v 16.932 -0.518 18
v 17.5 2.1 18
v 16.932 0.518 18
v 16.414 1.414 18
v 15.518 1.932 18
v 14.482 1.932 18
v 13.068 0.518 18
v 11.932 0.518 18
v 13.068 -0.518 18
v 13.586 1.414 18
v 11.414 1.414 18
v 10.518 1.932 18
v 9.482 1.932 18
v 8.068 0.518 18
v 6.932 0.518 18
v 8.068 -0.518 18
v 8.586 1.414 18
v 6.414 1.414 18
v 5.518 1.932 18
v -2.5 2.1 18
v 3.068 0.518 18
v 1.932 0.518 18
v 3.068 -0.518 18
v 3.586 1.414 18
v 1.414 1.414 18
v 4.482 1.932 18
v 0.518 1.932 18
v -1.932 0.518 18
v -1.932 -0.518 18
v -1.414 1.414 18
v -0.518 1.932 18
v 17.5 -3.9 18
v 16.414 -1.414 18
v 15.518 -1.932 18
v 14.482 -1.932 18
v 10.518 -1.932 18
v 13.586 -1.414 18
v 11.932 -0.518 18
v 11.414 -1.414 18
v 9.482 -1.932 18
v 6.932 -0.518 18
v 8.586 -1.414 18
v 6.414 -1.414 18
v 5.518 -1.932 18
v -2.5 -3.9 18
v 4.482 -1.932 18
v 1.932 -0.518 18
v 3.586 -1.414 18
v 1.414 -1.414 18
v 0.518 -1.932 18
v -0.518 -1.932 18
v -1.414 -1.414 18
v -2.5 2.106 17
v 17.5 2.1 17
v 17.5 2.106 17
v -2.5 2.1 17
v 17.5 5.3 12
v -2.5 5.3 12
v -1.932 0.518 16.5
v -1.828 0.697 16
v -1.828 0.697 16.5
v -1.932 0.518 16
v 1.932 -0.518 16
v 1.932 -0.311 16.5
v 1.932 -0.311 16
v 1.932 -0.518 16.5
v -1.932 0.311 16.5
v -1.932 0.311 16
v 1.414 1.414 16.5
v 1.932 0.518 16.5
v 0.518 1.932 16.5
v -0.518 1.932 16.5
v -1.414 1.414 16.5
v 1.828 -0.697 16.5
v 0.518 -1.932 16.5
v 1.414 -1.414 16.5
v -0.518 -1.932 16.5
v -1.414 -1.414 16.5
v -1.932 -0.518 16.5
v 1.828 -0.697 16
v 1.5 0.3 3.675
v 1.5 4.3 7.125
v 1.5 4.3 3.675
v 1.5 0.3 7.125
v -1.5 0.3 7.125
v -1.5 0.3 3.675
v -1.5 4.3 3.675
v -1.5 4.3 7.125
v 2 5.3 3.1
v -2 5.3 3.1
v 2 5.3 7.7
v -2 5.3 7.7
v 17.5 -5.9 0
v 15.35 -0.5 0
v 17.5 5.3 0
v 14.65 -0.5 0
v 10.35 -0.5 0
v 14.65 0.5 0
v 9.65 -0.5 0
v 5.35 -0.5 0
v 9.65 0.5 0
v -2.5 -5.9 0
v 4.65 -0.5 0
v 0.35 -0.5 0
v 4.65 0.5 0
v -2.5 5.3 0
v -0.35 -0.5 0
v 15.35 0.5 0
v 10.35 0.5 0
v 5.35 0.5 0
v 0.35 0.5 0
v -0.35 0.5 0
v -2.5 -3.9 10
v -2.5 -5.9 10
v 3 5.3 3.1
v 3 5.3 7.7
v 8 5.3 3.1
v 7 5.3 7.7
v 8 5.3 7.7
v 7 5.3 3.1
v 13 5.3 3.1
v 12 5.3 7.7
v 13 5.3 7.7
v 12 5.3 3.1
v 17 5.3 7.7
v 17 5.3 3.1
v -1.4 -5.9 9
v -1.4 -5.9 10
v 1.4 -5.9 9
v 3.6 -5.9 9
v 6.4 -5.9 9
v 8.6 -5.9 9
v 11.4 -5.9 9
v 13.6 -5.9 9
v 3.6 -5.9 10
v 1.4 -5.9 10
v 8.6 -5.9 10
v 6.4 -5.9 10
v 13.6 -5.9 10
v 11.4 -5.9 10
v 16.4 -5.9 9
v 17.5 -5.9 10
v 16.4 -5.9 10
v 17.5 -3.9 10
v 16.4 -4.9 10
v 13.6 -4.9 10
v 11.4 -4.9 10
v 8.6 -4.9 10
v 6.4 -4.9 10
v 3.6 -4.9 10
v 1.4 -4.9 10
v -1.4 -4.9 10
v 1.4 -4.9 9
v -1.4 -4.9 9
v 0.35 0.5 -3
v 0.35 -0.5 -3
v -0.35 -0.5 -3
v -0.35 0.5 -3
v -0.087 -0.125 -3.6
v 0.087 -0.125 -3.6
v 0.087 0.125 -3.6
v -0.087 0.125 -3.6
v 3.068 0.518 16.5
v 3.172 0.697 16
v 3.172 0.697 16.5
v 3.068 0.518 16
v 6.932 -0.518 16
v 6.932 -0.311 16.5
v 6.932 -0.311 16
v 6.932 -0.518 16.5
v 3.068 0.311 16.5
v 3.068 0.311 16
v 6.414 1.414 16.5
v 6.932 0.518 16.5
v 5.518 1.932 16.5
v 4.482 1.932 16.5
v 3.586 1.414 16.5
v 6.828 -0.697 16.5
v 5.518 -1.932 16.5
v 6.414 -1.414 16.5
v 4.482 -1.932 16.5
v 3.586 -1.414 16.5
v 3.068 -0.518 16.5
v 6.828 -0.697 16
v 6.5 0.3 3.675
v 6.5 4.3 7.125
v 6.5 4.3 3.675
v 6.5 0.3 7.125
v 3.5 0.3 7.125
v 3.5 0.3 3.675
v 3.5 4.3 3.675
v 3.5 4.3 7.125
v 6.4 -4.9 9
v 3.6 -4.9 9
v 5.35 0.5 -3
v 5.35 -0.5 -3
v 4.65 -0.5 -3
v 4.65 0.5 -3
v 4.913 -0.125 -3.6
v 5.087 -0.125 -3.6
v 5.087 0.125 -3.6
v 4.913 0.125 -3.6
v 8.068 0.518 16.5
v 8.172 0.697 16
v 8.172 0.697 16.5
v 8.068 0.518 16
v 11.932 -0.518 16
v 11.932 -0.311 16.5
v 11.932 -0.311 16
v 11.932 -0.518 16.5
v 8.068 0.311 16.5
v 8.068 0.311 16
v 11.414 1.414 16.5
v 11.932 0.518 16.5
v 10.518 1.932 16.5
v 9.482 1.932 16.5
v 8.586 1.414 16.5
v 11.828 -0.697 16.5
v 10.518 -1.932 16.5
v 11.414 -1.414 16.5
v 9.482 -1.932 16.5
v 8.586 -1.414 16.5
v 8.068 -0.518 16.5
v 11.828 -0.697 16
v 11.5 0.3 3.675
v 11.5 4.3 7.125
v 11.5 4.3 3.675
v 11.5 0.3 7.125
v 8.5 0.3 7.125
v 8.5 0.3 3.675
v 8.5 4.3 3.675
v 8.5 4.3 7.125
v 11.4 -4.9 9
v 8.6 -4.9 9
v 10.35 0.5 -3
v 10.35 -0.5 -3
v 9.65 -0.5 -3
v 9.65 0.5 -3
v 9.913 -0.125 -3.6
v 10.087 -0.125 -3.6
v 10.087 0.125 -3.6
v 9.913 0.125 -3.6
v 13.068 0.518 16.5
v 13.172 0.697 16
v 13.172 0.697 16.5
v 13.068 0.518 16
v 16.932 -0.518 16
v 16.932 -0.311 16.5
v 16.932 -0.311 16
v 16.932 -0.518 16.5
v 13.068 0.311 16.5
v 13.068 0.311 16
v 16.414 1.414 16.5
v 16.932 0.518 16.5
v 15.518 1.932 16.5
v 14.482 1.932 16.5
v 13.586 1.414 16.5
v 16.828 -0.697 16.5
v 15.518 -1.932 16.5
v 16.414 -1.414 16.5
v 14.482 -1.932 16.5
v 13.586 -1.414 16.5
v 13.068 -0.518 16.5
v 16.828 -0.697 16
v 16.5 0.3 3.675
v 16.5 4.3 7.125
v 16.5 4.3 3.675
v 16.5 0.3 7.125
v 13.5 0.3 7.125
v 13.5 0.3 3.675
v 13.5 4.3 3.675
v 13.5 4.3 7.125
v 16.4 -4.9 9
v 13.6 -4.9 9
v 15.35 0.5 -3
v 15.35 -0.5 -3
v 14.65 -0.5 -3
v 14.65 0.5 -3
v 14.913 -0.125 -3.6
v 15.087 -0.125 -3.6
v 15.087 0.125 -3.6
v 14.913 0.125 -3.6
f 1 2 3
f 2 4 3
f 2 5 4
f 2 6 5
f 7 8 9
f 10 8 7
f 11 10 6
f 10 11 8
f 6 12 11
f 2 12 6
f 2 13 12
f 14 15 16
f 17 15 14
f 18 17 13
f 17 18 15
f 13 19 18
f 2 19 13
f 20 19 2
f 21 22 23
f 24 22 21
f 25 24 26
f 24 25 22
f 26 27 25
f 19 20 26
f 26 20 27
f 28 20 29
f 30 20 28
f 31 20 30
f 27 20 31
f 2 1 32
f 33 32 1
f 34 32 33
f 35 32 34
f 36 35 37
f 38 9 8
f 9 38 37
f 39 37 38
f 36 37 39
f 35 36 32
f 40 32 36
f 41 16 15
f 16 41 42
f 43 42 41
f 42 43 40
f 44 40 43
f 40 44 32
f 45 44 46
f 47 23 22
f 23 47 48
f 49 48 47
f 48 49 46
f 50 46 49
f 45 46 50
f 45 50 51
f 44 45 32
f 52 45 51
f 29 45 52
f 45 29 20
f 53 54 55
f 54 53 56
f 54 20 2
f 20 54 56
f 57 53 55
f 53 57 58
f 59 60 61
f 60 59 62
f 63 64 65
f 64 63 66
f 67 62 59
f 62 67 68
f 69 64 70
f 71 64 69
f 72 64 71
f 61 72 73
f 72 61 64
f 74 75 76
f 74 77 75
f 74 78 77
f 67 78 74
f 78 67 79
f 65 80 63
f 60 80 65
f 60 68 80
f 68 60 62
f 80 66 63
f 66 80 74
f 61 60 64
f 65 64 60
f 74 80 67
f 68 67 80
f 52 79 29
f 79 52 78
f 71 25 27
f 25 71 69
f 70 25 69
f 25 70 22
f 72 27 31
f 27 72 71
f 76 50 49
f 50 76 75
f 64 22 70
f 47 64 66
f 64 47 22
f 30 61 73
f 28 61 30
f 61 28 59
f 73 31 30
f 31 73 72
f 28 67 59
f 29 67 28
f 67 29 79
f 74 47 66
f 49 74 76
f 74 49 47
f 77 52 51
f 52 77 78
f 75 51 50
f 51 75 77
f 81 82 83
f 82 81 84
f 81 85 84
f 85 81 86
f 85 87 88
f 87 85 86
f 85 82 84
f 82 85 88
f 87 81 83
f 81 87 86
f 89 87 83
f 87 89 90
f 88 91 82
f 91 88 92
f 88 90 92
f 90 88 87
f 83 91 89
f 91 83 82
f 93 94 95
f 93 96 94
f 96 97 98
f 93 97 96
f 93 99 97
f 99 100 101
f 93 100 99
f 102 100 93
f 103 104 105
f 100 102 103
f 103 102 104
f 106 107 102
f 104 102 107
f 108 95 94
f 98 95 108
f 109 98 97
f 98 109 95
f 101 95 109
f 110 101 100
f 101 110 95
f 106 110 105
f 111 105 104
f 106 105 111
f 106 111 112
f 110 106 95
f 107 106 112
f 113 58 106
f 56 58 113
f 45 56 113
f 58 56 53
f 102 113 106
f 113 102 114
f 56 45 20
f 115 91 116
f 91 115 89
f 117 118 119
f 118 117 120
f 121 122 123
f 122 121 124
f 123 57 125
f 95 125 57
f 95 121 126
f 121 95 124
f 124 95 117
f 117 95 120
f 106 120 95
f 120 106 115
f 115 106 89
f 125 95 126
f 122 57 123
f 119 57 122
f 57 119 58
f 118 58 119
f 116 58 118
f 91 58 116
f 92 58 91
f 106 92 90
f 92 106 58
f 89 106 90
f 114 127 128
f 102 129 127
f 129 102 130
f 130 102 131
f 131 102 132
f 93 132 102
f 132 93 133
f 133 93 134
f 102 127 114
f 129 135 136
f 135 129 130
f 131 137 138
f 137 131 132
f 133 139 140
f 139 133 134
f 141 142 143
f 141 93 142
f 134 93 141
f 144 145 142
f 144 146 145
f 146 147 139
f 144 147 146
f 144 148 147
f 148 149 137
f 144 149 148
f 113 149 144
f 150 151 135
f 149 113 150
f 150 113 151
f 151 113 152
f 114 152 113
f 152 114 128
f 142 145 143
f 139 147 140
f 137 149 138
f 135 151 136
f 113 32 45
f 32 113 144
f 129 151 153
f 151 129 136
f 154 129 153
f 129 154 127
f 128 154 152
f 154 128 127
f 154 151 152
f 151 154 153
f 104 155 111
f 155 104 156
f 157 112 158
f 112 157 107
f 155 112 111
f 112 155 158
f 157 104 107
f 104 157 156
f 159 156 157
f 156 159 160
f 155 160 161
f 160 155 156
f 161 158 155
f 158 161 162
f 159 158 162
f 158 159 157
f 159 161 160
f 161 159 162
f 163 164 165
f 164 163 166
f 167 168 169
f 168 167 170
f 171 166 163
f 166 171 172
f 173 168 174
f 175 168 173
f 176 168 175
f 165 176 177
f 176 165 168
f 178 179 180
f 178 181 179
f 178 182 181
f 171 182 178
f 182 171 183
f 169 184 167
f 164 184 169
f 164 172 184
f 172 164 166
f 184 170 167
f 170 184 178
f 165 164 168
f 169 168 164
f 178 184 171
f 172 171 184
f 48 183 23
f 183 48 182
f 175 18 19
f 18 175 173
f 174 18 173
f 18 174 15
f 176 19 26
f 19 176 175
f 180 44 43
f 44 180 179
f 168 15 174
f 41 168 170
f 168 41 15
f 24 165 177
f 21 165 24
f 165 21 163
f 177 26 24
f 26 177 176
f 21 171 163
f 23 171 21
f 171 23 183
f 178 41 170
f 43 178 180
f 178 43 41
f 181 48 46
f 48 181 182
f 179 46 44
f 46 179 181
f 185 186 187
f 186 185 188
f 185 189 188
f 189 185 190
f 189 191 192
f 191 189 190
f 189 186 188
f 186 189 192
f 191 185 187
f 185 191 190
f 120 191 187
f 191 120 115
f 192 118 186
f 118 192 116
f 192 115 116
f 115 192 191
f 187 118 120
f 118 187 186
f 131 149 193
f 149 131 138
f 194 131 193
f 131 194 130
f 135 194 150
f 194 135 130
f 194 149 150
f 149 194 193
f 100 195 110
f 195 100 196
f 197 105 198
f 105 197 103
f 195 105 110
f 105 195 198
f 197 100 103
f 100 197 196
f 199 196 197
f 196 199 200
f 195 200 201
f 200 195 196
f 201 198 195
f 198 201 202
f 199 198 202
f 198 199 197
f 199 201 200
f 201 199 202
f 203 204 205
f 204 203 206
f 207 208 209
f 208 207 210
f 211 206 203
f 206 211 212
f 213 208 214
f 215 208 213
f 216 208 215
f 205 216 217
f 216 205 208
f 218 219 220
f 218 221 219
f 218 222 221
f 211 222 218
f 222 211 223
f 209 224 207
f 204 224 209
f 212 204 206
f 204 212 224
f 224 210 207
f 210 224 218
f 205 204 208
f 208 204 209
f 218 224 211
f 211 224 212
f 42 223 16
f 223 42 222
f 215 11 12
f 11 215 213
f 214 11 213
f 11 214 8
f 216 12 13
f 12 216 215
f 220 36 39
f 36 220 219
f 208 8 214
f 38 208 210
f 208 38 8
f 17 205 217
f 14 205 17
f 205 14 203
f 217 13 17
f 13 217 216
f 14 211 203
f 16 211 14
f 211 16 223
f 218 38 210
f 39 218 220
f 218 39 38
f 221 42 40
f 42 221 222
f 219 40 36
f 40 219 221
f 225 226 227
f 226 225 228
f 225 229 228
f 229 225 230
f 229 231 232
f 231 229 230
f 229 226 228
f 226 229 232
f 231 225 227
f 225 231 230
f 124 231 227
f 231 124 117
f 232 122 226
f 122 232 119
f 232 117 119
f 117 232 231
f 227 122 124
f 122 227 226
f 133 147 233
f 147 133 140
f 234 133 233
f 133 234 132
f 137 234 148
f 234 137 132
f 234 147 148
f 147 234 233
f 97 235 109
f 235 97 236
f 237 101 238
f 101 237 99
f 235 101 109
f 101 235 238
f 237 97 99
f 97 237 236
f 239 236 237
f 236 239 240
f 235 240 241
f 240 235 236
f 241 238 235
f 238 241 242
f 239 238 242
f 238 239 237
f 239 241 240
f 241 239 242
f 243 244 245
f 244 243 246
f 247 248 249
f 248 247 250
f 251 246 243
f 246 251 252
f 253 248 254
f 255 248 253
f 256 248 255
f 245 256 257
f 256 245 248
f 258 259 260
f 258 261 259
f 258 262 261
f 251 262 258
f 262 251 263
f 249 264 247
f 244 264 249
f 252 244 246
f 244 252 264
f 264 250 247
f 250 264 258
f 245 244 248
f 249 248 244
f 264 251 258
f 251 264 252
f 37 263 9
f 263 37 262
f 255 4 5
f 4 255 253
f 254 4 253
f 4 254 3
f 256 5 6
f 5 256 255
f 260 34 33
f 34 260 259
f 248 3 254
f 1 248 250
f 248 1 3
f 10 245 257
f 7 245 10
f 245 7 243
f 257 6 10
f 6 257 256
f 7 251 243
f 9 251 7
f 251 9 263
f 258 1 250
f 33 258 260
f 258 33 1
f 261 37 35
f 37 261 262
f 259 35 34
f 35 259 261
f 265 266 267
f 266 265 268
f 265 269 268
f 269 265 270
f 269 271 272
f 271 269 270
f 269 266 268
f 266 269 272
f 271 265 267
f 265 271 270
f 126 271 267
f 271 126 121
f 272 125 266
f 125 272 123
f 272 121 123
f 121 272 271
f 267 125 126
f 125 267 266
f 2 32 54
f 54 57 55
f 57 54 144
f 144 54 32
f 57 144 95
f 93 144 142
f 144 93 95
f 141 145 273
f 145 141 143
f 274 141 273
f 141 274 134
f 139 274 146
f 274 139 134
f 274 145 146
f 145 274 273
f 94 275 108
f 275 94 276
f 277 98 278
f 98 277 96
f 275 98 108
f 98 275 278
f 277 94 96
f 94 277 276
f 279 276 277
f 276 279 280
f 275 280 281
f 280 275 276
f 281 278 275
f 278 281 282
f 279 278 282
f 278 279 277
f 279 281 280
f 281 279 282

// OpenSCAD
module wedge(x,y,z){
    translate([0,y/2,z/2]) resize([x,y,z]){
        rotate([0,90,0]) translate([0,0,-0.5]) linear_extrude(1){
            polygon([[-0.5,0.5],[-0.5,-0.5],[0.5,-0.5]],1);
        }
    }
}

module terminal(){
    translate([0,-0.3,0]){
        difference(){
            translate([0,0,9]) cube([5,11.2,18],true);
            translate([0,-4.6,14]) cube([5,2,8], true);
            translate([0,-5.1,9.5]) cube([2.8, 1, 1], true);
            translate([0,5.6,12]) rotate([0,0,180]){
                translate([0,1.6,5.5]) cube([5.01,3.2,1], true);
                wedge(5.01,3.2,5.01);
            }
            translate([0,0.3,16.5]) rotate([0,0,15]){
                cylinder(1.5,2,2,$fn=12);
                translate([0,0,-0.5]) rotate([0,0,60]){
                    intersection() {
                        cylinder(0.5,2,2,$fn=12);
                        translate([-0.2,-2,0]) cube([0.4,4,0.5]);
                    }
                }
            }
            translate([0,5.6,5.4]) rotate([90,0,0]){
                translate([0,0,3]) cube([3,3.45,4],true);
                resize([4,4.6,0]) rotate([0,0,45]) cylinder(1,4,3,$fn=4);
            }
        }
    }
    translate([0,0,-3]) {
        translate([-0.35,-0.5,0]) cube([0.7,1,3]);
        translate([0,0,-0.6]) resize([0.7,1,0.6]) rotate([0,0,45]){
            cylinder(1,0.25,1,$fn=4);
        }
    }
}

render(10){
    for(x=[0:5:15]){
        translate([x,0,0]) terminal();
    }
}
